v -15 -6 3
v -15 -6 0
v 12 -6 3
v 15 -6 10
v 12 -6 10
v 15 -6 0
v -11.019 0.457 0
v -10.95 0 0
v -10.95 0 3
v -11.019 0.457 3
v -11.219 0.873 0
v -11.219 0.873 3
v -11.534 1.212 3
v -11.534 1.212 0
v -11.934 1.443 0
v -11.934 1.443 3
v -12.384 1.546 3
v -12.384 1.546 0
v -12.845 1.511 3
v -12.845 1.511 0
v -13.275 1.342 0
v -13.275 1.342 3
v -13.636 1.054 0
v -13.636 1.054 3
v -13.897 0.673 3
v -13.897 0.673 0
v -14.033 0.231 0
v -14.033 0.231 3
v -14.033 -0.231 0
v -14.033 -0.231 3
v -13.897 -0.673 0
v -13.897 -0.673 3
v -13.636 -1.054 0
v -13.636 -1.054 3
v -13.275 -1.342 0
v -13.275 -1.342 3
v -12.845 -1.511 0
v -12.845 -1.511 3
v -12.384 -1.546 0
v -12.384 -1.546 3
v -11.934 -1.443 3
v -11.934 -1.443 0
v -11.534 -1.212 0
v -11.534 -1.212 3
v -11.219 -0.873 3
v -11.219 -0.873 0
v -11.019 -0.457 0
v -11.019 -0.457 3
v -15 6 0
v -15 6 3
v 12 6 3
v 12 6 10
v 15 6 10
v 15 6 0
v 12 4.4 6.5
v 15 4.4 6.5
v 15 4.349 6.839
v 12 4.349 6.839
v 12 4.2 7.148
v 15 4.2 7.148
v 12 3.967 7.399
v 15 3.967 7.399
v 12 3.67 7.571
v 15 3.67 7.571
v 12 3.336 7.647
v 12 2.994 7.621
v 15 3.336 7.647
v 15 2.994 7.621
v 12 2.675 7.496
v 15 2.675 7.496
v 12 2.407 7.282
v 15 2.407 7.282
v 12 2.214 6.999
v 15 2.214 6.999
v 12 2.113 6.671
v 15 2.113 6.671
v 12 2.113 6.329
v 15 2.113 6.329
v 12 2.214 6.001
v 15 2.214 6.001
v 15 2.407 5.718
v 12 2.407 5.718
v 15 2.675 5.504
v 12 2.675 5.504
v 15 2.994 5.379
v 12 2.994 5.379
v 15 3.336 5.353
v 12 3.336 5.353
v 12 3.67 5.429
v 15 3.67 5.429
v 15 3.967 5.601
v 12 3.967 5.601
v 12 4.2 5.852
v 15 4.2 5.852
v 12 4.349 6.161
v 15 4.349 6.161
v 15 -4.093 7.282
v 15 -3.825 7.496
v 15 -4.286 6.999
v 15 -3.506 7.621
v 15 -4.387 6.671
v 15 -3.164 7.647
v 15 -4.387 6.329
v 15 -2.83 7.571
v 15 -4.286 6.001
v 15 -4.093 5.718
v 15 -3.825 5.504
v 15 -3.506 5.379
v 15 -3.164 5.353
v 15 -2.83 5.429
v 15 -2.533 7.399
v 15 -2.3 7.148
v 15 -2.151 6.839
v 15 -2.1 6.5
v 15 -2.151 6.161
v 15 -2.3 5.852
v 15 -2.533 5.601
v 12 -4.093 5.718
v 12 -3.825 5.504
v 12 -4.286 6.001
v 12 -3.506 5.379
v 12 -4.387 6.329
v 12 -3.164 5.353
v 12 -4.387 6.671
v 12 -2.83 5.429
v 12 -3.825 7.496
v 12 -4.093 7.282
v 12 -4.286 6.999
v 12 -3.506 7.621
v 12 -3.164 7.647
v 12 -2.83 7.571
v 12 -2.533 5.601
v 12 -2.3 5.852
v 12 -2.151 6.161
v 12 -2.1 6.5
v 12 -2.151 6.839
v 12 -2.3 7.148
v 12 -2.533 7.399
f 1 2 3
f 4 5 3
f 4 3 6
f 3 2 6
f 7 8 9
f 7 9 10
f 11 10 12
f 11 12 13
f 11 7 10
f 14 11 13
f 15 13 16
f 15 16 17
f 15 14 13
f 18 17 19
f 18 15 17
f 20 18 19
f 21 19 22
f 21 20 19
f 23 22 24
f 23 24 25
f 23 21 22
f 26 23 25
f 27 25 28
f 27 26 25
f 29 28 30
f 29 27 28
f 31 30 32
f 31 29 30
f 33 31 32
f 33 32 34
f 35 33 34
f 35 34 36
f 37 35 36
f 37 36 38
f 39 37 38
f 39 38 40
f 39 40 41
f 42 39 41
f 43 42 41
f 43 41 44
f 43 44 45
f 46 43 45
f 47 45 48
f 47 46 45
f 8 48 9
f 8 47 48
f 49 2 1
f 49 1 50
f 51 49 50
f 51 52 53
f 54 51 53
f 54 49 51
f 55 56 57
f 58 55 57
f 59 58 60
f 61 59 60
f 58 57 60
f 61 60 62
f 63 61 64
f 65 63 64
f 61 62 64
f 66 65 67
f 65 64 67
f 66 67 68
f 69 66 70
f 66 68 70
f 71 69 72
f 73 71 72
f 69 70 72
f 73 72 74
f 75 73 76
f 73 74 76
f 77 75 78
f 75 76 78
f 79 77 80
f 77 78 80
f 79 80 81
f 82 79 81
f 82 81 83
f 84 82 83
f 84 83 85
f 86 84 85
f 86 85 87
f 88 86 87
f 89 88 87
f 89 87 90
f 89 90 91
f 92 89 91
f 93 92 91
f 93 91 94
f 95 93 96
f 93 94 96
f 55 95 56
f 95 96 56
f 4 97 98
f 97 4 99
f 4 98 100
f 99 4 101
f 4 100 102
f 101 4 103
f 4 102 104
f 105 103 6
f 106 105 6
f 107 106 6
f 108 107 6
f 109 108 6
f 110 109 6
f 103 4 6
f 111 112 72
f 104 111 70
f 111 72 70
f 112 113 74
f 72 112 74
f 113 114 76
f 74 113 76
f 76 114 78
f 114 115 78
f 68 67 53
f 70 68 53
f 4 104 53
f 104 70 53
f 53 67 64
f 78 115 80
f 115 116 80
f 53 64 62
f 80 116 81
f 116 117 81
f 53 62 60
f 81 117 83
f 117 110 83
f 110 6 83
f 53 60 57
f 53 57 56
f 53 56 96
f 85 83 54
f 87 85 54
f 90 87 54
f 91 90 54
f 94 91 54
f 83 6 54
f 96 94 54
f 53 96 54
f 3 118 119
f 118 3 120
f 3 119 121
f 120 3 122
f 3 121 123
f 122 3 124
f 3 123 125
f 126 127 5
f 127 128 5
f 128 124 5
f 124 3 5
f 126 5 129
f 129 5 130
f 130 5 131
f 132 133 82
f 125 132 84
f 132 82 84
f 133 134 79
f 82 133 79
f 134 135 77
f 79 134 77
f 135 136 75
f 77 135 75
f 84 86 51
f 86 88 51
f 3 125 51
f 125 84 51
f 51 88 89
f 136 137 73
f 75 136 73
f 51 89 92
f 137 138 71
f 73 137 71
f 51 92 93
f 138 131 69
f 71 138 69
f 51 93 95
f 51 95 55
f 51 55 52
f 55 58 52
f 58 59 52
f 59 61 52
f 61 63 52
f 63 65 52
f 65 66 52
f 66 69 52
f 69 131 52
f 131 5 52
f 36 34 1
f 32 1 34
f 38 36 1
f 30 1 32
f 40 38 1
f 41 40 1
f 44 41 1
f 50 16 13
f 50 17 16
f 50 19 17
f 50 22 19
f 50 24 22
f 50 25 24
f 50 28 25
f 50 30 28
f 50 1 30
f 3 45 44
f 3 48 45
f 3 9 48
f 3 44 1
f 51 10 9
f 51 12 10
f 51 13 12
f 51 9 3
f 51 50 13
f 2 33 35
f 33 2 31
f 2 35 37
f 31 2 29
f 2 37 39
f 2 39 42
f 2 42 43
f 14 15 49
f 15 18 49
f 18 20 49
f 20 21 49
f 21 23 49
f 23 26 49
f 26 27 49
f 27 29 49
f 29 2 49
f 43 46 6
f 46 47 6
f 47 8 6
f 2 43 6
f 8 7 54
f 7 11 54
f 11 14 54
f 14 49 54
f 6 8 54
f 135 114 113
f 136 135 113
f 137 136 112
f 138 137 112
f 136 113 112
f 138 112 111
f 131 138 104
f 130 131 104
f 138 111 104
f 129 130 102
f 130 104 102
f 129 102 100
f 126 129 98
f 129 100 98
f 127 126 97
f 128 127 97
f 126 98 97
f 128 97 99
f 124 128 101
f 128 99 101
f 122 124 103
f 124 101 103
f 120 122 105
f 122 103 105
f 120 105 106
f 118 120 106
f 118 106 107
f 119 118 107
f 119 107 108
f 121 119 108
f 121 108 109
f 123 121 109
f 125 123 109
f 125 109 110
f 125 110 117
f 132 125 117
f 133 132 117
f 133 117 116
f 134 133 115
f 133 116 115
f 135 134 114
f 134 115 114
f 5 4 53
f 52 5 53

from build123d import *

# Parameters (mm, degrees)
F0_W     = 30
F0_H     = 12
F0_R     = 1.55
F1_DEPTH = 3
F2_W     = 12
F2_H     = 10
F2_R     = 1.15
F3_DEPTH = 3


with BuildPart() as f1:
    # F0 (on Top) → F1 (new body)
    with BuildSketch(Plane.XY):
        Rectangle(F0_W, F0_H)
        with Locations((-12.5, 0)):
            Circle(F0_R, mode=Mode.SUBTRACT)
    extrude(amount=F1_DEPTH)

    # F2 (on face) → F3 (join)
    with BuildSketch(Plane.YZ.offset(15)):
        with Locations((0, 5)):
            Rectangle(F2_W, F2_H)
        with Locations((-3.25, 6.5)):
            Circle(F2_R, mode=Mode.SUBTRACT)
        with Locations((3.25, 6.5)):
            Circle(F2_R, mode=Mode.SUBTRACT)
    extrude(amount=-F3_DEPTH)


solid = f1.part
